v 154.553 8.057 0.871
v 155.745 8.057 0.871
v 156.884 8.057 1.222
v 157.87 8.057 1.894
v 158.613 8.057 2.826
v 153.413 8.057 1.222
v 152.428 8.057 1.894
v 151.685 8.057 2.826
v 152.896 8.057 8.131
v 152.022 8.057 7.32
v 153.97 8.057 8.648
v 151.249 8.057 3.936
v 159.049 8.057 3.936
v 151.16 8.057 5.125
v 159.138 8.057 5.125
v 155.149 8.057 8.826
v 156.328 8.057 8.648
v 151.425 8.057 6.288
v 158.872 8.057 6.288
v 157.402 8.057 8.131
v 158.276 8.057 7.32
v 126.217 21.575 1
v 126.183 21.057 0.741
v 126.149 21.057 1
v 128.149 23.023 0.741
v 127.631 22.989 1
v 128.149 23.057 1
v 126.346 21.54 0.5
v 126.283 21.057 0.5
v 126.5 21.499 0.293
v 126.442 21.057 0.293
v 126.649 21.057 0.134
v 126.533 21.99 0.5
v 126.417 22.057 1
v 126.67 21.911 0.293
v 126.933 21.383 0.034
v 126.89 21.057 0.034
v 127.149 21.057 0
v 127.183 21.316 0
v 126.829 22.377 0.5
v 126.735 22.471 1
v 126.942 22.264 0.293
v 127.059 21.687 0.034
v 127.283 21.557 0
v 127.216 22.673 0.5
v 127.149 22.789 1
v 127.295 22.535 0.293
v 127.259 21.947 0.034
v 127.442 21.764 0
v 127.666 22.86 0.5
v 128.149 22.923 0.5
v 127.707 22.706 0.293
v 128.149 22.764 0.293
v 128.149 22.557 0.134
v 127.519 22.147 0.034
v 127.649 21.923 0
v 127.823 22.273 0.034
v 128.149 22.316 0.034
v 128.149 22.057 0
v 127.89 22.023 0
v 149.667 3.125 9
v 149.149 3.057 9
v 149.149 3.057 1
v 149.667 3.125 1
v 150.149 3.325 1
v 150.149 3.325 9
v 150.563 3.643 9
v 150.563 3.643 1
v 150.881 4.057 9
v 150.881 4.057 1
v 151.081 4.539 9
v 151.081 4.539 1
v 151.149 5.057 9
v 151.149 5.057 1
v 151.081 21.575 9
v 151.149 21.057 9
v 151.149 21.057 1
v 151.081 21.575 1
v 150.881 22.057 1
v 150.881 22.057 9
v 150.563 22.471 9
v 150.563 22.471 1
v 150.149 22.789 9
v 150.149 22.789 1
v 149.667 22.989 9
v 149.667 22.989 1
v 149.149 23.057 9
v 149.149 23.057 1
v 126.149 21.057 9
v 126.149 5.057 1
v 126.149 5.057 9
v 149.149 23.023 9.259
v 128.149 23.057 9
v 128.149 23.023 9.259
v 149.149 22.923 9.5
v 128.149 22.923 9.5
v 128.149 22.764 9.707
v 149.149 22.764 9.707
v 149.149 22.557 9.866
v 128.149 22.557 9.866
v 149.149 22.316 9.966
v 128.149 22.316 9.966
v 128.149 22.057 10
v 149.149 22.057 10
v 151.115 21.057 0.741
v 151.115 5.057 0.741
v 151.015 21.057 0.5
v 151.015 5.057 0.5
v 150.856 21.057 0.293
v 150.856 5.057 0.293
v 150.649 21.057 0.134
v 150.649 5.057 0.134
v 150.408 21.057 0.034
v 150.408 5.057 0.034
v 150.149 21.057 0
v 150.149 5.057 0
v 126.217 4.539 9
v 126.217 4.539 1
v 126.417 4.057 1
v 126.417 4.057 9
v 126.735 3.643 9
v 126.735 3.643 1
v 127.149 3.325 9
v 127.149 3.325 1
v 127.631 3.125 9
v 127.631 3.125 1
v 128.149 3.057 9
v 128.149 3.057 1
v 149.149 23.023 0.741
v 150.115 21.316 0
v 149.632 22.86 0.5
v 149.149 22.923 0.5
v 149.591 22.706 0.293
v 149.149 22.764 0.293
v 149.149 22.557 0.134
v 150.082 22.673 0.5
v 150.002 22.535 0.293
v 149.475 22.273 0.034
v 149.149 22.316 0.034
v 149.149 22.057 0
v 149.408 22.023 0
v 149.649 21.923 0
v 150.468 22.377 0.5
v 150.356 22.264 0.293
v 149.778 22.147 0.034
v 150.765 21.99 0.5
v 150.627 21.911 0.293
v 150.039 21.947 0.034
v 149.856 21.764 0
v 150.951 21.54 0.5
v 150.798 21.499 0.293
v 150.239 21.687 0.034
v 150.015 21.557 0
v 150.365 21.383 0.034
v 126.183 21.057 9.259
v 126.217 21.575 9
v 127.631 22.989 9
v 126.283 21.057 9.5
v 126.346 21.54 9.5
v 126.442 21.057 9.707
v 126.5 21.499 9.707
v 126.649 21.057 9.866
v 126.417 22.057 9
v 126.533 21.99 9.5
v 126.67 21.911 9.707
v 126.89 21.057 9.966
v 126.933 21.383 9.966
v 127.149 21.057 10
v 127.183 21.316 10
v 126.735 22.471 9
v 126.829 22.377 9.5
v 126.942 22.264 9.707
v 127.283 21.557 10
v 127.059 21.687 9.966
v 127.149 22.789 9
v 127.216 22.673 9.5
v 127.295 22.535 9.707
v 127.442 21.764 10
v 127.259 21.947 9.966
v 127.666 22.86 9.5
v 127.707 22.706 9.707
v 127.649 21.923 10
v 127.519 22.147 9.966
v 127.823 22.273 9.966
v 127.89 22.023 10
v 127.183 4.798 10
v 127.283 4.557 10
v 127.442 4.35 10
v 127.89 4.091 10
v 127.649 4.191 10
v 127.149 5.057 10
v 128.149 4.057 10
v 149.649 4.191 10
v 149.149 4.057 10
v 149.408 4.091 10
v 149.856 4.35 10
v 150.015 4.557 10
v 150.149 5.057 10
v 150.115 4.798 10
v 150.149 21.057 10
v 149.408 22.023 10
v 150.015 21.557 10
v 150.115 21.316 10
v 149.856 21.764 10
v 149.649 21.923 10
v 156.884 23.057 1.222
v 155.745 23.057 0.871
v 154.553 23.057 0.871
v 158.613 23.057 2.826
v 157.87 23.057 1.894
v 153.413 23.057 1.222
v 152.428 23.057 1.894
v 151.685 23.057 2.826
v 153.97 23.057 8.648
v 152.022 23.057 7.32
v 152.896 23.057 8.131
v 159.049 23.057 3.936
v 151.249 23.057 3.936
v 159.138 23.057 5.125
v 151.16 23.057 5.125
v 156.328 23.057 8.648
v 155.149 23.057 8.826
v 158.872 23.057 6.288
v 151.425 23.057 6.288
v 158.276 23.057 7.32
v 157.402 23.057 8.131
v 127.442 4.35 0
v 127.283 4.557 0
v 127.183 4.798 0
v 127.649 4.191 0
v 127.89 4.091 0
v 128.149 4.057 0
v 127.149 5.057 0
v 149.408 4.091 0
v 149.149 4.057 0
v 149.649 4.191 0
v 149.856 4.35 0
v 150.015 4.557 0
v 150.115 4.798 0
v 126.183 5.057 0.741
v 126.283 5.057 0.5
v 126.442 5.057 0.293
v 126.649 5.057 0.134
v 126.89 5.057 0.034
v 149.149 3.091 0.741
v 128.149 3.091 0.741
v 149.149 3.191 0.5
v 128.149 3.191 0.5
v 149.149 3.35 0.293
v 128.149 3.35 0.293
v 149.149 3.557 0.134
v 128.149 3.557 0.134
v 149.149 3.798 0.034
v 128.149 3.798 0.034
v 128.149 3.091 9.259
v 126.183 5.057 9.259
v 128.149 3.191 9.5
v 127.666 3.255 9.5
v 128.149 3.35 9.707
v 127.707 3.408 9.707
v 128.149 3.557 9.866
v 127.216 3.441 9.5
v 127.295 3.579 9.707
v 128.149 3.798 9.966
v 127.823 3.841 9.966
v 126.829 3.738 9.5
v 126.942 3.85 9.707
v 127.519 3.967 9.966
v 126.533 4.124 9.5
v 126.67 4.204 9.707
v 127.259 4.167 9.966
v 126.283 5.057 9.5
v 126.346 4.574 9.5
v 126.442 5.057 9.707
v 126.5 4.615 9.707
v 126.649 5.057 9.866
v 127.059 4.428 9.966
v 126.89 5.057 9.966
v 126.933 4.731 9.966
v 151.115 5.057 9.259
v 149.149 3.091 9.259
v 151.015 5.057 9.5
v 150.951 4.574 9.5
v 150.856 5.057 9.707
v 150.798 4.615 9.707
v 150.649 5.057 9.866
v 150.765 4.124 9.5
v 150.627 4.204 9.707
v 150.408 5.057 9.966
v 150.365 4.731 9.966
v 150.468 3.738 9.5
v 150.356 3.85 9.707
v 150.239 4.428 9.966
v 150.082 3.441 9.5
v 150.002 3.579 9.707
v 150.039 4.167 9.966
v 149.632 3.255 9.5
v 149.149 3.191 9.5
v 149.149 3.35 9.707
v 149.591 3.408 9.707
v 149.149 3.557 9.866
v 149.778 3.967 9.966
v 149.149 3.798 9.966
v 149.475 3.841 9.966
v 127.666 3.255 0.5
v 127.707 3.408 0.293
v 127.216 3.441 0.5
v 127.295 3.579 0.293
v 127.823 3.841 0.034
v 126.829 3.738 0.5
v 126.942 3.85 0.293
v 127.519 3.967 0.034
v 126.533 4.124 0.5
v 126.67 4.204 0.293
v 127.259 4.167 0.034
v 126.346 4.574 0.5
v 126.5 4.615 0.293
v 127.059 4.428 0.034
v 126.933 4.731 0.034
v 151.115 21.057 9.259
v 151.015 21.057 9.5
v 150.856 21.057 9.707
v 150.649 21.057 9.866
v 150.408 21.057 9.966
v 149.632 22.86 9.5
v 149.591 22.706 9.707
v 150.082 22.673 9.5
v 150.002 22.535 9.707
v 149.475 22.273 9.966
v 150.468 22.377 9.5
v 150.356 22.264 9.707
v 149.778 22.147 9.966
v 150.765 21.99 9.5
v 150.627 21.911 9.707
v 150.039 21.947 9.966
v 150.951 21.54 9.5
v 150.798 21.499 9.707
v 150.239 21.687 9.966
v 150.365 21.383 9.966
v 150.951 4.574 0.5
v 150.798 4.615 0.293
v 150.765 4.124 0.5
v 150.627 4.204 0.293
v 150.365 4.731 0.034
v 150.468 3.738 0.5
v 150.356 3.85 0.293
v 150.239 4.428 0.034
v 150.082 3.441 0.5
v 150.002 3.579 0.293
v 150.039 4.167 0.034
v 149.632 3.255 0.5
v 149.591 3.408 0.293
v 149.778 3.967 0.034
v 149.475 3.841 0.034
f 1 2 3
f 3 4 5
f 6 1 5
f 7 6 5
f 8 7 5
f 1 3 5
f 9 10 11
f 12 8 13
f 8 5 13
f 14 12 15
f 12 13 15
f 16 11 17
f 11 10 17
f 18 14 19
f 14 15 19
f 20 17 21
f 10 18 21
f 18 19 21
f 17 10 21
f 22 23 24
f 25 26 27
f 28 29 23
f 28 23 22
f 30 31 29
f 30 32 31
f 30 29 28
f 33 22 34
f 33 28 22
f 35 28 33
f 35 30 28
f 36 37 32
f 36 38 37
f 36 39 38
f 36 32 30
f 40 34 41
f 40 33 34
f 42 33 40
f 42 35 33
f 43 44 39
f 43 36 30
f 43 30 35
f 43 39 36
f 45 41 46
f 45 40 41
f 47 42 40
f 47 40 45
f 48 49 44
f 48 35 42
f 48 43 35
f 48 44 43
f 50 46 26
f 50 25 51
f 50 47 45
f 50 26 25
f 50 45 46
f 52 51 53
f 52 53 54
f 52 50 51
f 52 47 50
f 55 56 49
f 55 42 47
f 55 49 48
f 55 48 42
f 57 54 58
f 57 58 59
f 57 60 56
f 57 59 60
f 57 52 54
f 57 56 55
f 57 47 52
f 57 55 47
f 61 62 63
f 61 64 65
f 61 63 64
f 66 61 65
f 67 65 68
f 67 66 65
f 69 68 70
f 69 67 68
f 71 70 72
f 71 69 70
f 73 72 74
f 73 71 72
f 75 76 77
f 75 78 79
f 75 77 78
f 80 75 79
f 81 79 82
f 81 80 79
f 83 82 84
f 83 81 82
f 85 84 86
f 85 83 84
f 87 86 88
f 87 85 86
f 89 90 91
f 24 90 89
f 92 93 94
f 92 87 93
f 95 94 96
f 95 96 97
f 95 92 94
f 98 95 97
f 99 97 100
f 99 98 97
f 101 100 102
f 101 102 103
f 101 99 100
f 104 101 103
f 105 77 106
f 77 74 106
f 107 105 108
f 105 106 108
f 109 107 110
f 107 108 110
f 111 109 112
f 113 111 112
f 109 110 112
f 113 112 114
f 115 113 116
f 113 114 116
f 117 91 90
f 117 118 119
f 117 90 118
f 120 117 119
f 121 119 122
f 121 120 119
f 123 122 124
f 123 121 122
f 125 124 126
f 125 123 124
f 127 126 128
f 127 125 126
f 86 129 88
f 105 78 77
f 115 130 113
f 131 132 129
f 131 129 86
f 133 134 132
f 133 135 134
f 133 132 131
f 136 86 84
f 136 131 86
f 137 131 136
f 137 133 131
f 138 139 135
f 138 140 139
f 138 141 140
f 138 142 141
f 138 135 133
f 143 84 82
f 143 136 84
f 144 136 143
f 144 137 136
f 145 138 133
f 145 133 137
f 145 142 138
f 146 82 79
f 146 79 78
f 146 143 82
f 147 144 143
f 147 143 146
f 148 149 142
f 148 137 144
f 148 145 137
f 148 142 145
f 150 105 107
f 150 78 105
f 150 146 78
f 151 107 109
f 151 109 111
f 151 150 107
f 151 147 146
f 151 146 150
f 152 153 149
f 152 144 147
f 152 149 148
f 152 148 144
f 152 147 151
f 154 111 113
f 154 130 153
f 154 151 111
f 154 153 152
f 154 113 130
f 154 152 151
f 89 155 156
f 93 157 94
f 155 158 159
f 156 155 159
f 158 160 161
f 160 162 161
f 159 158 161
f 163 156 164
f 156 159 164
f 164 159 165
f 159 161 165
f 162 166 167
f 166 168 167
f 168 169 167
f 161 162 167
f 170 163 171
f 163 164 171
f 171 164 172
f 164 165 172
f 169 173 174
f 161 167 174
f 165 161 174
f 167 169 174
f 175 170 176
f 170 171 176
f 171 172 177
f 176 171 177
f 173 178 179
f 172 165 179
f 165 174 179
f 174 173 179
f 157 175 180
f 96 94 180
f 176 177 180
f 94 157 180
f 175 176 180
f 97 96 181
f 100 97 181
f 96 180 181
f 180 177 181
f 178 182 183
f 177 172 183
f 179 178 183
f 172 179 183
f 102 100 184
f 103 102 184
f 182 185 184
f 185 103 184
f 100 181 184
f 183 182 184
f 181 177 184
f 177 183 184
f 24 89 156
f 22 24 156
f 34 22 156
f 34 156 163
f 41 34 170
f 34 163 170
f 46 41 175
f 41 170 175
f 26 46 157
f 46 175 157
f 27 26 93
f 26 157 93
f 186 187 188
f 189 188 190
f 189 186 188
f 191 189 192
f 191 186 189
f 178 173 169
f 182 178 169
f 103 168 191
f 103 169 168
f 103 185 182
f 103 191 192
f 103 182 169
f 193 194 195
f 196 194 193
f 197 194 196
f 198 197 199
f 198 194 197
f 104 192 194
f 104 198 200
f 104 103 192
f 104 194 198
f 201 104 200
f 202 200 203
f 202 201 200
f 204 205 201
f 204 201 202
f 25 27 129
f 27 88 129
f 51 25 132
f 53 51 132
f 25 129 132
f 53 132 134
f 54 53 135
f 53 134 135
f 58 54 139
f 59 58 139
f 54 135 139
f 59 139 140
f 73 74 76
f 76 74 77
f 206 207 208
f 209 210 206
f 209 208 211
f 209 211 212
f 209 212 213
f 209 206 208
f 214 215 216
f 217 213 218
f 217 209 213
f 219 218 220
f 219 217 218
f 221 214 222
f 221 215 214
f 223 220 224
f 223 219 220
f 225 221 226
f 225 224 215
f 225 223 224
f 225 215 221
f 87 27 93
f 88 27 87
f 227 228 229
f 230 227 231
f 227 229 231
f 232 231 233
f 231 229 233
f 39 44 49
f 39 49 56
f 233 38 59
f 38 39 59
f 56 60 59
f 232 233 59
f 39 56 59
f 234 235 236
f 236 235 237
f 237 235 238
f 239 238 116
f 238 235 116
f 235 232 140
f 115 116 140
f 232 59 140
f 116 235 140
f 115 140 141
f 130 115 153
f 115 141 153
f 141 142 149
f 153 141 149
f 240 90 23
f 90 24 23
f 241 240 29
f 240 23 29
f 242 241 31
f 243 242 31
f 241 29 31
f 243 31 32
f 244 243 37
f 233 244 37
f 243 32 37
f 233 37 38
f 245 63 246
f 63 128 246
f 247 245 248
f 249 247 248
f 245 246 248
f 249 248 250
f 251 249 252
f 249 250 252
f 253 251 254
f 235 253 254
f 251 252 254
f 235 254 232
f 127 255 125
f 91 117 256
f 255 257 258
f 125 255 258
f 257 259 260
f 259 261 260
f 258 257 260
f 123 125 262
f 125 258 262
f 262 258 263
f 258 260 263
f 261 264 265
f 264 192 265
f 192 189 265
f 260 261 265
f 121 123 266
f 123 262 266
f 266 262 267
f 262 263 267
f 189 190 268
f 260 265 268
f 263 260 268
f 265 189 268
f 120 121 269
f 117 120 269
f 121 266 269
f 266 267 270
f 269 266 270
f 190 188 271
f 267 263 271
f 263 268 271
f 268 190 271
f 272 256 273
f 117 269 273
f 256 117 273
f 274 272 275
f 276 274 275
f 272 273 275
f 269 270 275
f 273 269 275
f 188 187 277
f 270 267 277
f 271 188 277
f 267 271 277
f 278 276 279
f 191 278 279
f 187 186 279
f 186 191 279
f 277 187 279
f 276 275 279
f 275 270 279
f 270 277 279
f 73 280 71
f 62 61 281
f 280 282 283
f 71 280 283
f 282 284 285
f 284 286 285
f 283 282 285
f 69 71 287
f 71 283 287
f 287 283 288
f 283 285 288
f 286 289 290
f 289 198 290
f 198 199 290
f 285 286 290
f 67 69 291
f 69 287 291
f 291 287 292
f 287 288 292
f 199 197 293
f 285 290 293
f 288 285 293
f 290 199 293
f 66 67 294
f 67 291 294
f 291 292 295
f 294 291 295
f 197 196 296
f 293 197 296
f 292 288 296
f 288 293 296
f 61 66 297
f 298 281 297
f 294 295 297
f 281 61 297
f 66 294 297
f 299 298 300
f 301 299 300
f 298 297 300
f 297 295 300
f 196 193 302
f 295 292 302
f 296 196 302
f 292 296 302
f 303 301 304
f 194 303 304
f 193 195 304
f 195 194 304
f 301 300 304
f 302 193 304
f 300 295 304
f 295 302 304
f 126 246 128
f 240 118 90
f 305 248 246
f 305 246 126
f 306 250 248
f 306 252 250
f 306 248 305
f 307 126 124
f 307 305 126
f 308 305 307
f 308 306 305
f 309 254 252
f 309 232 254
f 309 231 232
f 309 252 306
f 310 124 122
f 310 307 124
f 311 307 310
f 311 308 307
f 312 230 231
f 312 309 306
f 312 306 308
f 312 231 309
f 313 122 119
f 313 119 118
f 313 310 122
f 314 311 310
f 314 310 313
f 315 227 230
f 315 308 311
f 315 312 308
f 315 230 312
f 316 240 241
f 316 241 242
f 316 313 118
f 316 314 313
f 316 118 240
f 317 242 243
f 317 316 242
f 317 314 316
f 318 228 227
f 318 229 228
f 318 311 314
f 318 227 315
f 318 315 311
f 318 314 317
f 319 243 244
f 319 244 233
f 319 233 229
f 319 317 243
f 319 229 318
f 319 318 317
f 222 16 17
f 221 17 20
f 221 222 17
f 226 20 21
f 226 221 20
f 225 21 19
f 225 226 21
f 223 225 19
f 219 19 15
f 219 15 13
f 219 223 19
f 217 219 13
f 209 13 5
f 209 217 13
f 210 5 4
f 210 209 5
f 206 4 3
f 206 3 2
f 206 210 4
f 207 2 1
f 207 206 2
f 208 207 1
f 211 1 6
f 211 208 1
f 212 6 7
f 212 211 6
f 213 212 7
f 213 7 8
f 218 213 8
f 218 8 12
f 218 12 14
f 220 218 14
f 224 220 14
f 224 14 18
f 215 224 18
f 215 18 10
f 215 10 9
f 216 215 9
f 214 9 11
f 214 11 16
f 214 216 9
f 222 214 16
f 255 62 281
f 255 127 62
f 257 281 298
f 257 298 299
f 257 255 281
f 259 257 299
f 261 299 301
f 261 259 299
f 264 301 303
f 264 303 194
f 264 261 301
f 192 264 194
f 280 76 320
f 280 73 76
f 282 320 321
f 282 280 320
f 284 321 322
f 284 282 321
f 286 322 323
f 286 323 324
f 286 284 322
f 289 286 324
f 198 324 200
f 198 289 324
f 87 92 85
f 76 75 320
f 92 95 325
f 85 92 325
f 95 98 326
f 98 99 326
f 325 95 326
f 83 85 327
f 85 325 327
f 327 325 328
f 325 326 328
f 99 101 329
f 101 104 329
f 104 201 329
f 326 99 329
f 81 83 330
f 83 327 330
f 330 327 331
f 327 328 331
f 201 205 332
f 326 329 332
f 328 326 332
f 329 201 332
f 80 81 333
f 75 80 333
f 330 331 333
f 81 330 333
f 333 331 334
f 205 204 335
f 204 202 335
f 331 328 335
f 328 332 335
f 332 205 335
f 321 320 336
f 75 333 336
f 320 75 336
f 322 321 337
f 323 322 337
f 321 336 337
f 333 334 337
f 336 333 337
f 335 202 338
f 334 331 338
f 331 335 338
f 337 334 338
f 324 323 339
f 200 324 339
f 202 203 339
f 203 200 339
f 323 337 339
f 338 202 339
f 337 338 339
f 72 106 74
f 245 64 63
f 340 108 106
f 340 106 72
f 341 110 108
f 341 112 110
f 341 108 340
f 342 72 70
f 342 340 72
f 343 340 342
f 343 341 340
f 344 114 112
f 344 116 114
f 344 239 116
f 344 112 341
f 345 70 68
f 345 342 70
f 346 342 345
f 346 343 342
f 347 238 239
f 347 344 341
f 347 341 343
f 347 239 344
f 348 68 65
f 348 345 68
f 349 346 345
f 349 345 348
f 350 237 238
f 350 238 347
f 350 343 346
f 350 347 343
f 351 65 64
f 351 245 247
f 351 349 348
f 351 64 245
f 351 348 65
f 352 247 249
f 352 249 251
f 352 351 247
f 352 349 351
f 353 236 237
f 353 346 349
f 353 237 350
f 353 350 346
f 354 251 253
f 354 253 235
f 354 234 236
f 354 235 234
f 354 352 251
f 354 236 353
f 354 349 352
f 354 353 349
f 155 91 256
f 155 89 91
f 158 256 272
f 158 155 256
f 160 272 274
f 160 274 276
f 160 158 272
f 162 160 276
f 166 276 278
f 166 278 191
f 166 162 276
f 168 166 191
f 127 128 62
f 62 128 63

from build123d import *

# Parameters (mm, degrees)
SKETCH1_W           = 25
SKETCH1_H           = 20
BOSS_EXTRUDE1_DEPTH = 10
SKETCH2_R           = 4
BOSS_EXTRUDE2_DEPTH = 15
FILLET1_R           = 2
FILLET2_R           = 1


with BuildPart() as part:
    # Sketch1 → Boss-Extrude1 (new body)
    with BuildSketch(Plane.XY):
        with Locations((138.648869639, 13.05710113)):
            Rectangle(SKETCH1_W, SKETCH1_H)
    extrude(amount=BOSS_EXTRUDE1_DEPTH)

    # Fillet1
    fillet1_edges = [part.edges().sort_by_distance(p)[0] for p in [
        (126.148869639, 23.05710113, 5),
        (151.148869639, 23.05710113, 5),
        (151.148869639, 3.05710113, 5),
        (126.148869639, 3.05710113, 5),
    ]]
    fillet(fillet1_edges, radius=FILLET1_R)

    # Fillet2
    fillet2_edges = [part.edges().sort_by_distance(p)[0] for p in [
        (126.148869639, 13.05710113, 0),
        (126.148869639, 13.05710113, 10),
        (138.648869639, 23.05710113, 0),
        (151.148869639, 13.05710113, 0),
        (138.648869639, 3.05710113, 0),
        (126.734656077, 3.642887568, 0),
        (150.563083201, 3.642887568, 0),
        (150.563083201, 22.471314692, 0),
        (126.734656077, 22.471314692, 0),
        (138.648869639, 23.05710113, 10),
        (138.648869639, 3.05710113, 10),
        (151.148869639, 13.05710113, 10),
        (126.734656077, 3.642887568, 10),
        (150.563083201, 3.642887568, 10),
        (150.563083201, 22.471314692, 10),
        (126.734656077, 22.471314692, 10),
    ]]
    fillet(fillet2_edges, radius=FILLET2_R)


with BuildPart() as body_2:
    # Sketch2 → Boss-Extrude2 (new body)
    with BuildSketch(Plane(origin=(0, 23.05710113, 0), x_dir=(1, 0, 0), z_dir=(0, 1, 0))):
        with Locations(Location((155.148869639, -4.82615975, 0), (0, 0, 270))):
            Circle(SKETCH2_R)
    extrude(amount=-BOSS_EXTRUDE2_DEPTH)


solid = Compound([part.part, body_2.part])
